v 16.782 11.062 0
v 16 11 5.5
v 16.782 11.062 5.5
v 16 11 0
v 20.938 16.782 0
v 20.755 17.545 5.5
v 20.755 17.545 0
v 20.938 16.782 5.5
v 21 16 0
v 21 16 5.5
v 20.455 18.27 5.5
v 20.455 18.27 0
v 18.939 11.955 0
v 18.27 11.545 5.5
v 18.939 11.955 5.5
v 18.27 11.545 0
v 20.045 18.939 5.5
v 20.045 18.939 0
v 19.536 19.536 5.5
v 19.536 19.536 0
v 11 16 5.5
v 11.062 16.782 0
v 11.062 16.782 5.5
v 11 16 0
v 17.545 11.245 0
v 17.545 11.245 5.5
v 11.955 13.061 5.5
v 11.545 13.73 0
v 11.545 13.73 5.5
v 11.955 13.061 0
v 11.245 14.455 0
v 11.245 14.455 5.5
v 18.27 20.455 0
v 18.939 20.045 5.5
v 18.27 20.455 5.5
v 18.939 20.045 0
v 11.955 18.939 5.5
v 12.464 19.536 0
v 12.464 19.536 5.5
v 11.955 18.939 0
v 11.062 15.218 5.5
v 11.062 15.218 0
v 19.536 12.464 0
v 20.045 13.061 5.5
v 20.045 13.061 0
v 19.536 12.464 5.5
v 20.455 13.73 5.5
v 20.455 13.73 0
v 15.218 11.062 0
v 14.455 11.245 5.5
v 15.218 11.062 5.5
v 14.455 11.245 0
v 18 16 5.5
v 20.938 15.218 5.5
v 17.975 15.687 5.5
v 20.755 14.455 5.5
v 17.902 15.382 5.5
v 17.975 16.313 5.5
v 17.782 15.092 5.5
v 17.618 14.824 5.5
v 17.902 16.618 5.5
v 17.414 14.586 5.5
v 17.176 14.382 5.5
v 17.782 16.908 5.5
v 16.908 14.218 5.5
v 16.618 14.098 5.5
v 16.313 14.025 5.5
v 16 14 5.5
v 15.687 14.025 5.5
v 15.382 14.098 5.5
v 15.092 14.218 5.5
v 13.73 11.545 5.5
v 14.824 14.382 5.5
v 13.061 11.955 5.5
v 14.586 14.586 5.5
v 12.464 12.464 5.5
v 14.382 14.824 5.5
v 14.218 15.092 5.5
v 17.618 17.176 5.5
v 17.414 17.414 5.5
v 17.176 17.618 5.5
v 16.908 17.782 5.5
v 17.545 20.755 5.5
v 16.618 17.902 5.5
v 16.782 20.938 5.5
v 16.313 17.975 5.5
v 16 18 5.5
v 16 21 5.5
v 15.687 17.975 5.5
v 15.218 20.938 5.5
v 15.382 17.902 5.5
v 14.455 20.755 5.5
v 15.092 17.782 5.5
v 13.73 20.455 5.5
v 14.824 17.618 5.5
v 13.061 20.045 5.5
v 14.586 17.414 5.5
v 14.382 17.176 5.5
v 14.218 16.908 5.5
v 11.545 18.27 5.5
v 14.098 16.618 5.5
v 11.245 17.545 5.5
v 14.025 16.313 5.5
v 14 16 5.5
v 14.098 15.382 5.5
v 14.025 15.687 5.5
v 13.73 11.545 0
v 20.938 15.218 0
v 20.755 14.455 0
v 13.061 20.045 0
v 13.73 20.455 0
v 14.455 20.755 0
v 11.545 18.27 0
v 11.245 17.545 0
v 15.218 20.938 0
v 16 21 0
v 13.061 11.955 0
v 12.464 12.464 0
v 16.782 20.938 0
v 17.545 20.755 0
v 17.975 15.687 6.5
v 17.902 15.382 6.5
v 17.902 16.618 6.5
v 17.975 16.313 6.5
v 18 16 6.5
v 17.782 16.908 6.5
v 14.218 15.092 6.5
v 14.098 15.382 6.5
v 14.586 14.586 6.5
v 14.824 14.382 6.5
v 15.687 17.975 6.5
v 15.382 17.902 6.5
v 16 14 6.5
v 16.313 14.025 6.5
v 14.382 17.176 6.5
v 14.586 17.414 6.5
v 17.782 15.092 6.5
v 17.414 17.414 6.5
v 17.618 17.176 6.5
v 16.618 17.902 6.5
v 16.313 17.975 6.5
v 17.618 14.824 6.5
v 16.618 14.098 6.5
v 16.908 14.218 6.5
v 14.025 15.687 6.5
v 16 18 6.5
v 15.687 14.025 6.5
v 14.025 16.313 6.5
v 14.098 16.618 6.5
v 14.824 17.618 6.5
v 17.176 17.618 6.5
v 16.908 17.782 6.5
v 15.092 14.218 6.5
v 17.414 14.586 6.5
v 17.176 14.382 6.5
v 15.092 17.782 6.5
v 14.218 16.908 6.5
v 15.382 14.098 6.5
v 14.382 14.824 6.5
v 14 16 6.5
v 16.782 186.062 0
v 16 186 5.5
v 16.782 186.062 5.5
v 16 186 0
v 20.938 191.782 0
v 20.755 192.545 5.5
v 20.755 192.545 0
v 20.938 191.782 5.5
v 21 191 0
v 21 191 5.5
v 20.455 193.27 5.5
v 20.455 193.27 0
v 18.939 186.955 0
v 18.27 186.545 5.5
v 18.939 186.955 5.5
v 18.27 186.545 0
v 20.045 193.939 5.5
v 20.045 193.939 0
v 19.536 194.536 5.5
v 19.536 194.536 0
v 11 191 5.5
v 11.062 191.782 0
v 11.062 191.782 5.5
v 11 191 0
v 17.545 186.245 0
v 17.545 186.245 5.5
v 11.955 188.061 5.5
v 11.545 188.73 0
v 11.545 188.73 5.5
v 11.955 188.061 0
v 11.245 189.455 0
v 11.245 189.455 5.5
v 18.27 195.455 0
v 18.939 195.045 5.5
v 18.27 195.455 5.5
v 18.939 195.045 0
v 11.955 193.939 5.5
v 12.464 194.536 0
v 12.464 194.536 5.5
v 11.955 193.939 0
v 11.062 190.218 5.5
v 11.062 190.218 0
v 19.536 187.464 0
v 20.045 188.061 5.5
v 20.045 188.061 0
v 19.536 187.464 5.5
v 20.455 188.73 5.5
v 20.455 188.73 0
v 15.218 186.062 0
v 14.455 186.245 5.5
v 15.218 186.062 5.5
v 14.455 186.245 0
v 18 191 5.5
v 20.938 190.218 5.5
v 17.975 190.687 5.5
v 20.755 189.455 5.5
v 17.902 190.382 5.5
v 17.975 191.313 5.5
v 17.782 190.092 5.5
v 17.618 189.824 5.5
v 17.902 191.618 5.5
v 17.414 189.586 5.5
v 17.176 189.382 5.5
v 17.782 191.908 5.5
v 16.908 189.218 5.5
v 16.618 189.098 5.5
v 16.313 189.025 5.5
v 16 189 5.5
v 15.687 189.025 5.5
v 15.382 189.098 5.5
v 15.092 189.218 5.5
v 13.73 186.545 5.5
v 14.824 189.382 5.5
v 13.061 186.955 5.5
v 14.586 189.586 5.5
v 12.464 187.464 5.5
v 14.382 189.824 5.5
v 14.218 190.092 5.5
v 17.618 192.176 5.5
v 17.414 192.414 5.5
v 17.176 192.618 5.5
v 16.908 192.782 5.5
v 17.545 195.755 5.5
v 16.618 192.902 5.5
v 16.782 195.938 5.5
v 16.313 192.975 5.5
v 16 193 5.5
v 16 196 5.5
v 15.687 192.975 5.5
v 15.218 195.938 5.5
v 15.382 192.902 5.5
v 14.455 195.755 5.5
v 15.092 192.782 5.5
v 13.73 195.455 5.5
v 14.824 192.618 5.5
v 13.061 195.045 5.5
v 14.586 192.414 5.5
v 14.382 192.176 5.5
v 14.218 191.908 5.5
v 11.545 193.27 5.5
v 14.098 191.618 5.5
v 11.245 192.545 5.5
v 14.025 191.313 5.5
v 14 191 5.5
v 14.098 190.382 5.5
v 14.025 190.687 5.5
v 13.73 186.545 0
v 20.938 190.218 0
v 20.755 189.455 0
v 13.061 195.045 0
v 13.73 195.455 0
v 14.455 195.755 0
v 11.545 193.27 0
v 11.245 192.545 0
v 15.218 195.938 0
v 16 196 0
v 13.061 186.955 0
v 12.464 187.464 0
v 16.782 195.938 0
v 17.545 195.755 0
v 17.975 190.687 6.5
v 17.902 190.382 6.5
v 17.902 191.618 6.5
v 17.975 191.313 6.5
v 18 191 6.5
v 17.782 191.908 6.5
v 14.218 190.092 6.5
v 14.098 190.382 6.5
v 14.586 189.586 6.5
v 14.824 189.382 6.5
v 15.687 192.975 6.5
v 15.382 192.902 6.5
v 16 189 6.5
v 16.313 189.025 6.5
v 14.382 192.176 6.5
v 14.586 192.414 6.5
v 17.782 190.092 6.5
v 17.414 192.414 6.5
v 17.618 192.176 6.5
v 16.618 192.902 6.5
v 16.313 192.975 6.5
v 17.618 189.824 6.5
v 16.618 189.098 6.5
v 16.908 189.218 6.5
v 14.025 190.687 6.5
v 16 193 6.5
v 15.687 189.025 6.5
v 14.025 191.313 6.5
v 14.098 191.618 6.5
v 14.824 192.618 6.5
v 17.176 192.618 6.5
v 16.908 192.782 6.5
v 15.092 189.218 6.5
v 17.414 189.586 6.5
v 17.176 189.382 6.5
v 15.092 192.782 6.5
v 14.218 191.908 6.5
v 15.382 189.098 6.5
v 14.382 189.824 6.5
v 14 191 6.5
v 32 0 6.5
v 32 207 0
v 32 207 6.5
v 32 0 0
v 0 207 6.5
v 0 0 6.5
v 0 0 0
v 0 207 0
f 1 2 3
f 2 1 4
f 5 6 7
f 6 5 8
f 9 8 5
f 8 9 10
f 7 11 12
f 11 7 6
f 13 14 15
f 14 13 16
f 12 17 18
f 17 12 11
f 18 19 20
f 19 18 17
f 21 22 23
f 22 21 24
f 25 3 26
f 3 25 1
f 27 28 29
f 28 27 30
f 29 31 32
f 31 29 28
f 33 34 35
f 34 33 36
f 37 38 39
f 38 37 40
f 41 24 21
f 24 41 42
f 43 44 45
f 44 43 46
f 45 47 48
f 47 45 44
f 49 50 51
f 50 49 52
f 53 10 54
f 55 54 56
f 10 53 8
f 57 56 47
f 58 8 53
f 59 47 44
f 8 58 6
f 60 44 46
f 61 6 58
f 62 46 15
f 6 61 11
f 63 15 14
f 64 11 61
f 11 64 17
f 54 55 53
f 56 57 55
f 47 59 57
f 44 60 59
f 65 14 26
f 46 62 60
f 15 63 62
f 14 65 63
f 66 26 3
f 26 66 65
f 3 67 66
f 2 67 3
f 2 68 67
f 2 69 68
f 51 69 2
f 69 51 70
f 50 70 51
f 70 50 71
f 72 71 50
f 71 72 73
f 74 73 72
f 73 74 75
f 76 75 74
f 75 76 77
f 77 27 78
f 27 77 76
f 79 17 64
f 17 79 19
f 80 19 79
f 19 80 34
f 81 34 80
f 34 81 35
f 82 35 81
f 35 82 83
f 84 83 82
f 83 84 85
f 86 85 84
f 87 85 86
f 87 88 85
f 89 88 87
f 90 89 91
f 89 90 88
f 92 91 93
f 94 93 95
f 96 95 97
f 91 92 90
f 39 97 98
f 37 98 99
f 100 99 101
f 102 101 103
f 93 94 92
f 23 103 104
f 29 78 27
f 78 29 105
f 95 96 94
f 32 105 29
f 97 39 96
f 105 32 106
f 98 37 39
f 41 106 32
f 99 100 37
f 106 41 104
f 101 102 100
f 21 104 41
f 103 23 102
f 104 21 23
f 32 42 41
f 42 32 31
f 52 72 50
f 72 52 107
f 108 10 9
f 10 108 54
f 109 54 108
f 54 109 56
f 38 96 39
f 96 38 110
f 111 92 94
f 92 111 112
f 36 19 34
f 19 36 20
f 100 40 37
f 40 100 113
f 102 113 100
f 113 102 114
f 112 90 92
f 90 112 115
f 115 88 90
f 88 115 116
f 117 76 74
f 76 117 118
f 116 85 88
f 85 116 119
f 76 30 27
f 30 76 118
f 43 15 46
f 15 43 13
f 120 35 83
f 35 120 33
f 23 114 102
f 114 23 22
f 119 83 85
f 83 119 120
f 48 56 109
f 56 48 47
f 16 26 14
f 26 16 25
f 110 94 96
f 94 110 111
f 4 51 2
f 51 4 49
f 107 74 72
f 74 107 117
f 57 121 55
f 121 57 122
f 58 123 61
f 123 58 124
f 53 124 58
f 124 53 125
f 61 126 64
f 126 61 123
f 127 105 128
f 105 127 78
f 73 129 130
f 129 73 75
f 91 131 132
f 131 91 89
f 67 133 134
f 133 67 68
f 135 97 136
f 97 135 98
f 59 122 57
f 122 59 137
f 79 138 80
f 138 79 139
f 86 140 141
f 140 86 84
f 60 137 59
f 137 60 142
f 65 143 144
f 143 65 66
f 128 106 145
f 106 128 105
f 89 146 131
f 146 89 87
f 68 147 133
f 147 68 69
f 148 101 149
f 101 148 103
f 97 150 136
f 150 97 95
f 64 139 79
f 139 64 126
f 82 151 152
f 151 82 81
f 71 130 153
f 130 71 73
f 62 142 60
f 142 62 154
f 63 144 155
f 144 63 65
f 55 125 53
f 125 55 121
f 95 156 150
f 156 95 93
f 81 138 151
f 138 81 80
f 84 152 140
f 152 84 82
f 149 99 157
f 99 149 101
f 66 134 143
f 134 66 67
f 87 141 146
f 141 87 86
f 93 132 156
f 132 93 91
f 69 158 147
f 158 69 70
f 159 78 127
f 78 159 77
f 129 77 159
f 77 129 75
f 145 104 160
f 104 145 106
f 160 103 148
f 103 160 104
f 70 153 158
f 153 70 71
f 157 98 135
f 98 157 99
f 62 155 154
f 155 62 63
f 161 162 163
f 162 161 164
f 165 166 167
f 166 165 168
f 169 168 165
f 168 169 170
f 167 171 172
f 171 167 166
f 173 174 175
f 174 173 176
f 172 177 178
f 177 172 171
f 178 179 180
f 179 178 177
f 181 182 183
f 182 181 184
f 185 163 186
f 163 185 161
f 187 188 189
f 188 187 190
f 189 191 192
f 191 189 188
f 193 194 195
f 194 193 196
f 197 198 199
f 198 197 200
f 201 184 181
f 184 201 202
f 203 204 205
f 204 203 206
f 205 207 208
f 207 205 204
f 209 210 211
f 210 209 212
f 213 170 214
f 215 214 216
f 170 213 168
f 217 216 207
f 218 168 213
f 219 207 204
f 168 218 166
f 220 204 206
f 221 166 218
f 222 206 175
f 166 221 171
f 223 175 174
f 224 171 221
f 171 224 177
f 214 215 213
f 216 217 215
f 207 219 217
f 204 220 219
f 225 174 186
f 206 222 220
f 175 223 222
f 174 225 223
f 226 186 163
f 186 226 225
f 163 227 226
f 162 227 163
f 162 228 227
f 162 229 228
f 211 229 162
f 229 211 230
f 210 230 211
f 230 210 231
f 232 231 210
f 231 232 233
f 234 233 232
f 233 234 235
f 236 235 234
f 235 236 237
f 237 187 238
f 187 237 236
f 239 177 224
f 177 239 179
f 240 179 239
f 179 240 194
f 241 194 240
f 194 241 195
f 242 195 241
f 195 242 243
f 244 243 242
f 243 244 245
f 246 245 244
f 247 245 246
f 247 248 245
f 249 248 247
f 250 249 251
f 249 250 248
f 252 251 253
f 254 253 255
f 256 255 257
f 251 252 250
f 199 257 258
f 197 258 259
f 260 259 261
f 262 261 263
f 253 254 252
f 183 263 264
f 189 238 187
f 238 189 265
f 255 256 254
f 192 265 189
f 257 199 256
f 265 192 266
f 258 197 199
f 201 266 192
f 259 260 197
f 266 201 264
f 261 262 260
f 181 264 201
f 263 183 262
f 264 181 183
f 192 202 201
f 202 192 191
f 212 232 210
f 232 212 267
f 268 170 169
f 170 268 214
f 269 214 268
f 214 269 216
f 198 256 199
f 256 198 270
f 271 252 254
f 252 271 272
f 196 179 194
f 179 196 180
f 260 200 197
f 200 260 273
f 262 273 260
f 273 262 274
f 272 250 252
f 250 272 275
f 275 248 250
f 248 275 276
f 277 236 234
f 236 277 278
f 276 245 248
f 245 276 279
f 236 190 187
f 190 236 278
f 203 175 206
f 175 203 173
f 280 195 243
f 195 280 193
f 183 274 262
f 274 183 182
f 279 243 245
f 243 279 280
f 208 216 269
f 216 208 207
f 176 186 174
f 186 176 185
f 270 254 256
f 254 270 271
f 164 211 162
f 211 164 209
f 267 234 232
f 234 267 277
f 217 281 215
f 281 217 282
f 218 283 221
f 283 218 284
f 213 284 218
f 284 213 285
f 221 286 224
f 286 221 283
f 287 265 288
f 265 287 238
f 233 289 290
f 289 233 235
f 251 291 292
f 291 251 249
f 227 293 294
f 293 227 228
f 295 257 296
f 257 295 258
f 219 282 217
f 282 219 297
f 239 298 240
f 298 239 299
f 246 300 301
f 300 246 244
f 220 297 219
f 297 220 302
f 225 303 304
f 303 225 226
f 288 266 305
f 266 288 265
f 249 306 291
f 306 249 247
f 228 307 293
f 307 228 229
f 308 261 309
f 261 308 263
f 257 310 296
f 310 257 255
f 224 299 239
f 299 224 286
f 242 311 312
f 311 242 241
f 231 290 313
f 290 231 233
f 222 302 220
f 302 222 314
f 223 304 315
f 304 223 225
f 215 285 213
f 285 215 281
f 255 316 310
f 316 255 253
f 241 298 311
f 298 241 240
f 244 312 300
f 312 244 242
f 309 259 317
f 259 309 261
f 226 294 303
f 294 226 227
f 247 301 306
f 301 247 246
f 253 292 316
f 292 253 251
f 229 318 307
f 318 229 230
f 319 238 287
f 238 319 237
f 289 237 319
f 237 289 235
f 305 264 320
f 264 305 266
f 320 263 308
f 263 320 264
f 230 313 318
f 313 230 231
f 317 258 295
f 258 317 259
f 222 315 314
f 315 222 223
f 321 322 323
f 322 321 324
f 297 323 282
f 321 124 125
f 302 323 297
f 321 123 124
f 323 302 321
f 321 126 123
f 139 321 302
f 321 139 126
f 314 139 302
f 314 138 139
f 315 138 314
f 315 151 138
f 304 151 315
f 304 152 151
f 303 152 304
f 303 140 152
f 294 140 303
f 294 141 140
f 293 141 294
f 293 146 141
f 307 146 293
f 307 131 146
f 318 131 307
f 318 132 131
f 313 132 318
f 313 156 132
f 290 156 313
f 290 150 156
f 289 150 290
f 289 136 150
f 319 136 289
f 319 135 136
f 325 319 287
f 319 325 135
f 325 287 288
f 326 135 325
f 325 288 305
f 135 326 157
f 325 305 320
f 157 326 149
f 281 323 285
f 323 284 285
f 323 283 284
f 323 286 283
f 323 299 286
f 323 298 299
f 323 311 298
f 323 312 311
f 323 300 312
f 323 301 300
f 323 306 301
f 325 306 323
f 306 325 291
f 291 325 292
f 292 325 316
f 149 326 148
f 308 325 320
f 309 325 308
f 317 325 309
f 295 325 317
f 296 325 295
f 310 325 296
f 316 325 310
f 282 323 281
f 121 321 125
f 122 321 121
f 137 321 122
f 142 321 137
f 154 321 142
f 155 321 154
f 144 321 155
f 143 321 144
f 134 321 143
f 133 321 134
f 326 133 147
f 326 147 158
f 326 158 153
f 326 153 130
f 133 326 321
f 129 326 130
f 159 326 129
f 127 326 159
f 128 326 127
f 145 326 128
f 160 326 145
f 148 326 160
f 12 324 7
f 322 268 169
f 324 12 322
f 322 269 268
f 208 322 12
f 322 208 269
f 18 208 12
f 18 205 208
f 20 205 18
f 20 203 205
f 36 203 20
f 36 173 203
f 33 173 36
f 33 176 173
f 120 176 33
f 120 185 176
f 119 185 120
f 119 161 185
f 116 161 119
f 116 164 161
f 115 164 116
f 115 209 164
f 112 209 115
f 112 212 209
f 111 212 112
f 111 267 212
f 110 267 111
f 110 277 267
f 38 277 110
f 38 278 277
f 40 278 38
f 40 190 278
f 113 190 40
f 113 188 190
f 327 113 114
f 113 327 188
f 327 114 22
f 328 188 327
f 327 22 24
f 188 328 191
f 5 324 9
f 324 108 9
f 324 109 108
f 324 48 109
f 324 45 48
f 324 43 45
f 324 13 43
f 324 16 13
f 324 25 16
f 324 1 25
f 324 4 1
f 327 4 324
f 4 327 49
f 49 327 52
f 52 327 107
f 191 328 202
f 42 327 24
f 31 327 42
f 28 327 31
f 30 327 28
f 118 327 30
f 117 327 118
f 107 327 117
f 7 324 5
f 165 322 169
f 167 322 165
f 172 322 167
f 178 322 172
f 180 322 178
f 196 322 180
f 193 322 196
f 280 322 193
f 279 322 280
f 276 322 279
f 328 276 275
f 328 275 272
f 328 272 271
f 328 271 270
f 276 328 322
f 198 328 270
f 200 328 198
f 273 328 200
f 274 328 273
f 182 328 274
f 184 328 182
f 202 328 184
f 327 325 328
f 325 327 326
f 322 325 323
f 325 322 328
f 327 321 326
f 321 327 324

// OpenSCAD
wall           =   1;
line_height    = 207;
line_thick     =  32;

magnet_height1 =   4.5;
magnet_height2 =  12.5;
magnet_diam    =  10;
screw_diam     =   4;
nut_height     =   3.2;
nut_diam       =   8;
$fn            =  40;

screw_height = magnet_height2-magnet_height1;
nut_radius   = 0.5 * nut_diam;

module hexagon(radius) {
    polygon(
        points = [
            [radius * sin(0*60), radius * cos(0*60)],
            [radius * sin(1*60), radius * cos(1*60)],
            [radius * sin(2*60), radius * cos(2*60)],
            [radius * sin(3*60), radius * cos(3*60)],
            [radius * sin(4*60), radius * cos(4*60)],
            [radius * sin(5*60), radius * cos(5*60)]
        ]
    );
}

module nut(radius, height) {
    linear_extrude(height) {
        hexagon(radius);
    };
}

module screw() {
    cylinder( d = screw_diam, h = screw_height );
}

module magnet() {
    cylinder( d = magnet_diam, h = magnet_height1+2 );
    translate([0, 0, magnet_height1]) screw();
}

module magnet_complet() {
    translate([0, 0, -1])
        magnet();
    translate([0, 0, magnet_height2-nut_height])
        nut(nut_radius, nut_height+1);
    translate([0, 0, magnet_height2])
        nut(nut_radius, nut_height+1);
}

module line_magnet() {
    difference() {
        cube([line_thick, line_height, magnet_height1+wall+1]);

        translate([0.5*line_thick, 0.5*line_thick, 0])
            magnet_complet();
        translate([0.5*line_thick, line_height-0.5*line_thick, 0])
            magnet_complet();
    }
}

module line_cover() {
    difference() {
        cube([line_thick, line_height, screw_height+wall+1]);
        
        translate([0.5*line_thick, 0.5*line_thick, -1])
            nut(nut_radius, 2*nut_height+1);
        
        translate([0.5*line_thick, line_height-0.5*line_thick, -1])
            nut(nut_radius, 2*nut_height+1);
    }
}


line_magnet();
//line_cover();
